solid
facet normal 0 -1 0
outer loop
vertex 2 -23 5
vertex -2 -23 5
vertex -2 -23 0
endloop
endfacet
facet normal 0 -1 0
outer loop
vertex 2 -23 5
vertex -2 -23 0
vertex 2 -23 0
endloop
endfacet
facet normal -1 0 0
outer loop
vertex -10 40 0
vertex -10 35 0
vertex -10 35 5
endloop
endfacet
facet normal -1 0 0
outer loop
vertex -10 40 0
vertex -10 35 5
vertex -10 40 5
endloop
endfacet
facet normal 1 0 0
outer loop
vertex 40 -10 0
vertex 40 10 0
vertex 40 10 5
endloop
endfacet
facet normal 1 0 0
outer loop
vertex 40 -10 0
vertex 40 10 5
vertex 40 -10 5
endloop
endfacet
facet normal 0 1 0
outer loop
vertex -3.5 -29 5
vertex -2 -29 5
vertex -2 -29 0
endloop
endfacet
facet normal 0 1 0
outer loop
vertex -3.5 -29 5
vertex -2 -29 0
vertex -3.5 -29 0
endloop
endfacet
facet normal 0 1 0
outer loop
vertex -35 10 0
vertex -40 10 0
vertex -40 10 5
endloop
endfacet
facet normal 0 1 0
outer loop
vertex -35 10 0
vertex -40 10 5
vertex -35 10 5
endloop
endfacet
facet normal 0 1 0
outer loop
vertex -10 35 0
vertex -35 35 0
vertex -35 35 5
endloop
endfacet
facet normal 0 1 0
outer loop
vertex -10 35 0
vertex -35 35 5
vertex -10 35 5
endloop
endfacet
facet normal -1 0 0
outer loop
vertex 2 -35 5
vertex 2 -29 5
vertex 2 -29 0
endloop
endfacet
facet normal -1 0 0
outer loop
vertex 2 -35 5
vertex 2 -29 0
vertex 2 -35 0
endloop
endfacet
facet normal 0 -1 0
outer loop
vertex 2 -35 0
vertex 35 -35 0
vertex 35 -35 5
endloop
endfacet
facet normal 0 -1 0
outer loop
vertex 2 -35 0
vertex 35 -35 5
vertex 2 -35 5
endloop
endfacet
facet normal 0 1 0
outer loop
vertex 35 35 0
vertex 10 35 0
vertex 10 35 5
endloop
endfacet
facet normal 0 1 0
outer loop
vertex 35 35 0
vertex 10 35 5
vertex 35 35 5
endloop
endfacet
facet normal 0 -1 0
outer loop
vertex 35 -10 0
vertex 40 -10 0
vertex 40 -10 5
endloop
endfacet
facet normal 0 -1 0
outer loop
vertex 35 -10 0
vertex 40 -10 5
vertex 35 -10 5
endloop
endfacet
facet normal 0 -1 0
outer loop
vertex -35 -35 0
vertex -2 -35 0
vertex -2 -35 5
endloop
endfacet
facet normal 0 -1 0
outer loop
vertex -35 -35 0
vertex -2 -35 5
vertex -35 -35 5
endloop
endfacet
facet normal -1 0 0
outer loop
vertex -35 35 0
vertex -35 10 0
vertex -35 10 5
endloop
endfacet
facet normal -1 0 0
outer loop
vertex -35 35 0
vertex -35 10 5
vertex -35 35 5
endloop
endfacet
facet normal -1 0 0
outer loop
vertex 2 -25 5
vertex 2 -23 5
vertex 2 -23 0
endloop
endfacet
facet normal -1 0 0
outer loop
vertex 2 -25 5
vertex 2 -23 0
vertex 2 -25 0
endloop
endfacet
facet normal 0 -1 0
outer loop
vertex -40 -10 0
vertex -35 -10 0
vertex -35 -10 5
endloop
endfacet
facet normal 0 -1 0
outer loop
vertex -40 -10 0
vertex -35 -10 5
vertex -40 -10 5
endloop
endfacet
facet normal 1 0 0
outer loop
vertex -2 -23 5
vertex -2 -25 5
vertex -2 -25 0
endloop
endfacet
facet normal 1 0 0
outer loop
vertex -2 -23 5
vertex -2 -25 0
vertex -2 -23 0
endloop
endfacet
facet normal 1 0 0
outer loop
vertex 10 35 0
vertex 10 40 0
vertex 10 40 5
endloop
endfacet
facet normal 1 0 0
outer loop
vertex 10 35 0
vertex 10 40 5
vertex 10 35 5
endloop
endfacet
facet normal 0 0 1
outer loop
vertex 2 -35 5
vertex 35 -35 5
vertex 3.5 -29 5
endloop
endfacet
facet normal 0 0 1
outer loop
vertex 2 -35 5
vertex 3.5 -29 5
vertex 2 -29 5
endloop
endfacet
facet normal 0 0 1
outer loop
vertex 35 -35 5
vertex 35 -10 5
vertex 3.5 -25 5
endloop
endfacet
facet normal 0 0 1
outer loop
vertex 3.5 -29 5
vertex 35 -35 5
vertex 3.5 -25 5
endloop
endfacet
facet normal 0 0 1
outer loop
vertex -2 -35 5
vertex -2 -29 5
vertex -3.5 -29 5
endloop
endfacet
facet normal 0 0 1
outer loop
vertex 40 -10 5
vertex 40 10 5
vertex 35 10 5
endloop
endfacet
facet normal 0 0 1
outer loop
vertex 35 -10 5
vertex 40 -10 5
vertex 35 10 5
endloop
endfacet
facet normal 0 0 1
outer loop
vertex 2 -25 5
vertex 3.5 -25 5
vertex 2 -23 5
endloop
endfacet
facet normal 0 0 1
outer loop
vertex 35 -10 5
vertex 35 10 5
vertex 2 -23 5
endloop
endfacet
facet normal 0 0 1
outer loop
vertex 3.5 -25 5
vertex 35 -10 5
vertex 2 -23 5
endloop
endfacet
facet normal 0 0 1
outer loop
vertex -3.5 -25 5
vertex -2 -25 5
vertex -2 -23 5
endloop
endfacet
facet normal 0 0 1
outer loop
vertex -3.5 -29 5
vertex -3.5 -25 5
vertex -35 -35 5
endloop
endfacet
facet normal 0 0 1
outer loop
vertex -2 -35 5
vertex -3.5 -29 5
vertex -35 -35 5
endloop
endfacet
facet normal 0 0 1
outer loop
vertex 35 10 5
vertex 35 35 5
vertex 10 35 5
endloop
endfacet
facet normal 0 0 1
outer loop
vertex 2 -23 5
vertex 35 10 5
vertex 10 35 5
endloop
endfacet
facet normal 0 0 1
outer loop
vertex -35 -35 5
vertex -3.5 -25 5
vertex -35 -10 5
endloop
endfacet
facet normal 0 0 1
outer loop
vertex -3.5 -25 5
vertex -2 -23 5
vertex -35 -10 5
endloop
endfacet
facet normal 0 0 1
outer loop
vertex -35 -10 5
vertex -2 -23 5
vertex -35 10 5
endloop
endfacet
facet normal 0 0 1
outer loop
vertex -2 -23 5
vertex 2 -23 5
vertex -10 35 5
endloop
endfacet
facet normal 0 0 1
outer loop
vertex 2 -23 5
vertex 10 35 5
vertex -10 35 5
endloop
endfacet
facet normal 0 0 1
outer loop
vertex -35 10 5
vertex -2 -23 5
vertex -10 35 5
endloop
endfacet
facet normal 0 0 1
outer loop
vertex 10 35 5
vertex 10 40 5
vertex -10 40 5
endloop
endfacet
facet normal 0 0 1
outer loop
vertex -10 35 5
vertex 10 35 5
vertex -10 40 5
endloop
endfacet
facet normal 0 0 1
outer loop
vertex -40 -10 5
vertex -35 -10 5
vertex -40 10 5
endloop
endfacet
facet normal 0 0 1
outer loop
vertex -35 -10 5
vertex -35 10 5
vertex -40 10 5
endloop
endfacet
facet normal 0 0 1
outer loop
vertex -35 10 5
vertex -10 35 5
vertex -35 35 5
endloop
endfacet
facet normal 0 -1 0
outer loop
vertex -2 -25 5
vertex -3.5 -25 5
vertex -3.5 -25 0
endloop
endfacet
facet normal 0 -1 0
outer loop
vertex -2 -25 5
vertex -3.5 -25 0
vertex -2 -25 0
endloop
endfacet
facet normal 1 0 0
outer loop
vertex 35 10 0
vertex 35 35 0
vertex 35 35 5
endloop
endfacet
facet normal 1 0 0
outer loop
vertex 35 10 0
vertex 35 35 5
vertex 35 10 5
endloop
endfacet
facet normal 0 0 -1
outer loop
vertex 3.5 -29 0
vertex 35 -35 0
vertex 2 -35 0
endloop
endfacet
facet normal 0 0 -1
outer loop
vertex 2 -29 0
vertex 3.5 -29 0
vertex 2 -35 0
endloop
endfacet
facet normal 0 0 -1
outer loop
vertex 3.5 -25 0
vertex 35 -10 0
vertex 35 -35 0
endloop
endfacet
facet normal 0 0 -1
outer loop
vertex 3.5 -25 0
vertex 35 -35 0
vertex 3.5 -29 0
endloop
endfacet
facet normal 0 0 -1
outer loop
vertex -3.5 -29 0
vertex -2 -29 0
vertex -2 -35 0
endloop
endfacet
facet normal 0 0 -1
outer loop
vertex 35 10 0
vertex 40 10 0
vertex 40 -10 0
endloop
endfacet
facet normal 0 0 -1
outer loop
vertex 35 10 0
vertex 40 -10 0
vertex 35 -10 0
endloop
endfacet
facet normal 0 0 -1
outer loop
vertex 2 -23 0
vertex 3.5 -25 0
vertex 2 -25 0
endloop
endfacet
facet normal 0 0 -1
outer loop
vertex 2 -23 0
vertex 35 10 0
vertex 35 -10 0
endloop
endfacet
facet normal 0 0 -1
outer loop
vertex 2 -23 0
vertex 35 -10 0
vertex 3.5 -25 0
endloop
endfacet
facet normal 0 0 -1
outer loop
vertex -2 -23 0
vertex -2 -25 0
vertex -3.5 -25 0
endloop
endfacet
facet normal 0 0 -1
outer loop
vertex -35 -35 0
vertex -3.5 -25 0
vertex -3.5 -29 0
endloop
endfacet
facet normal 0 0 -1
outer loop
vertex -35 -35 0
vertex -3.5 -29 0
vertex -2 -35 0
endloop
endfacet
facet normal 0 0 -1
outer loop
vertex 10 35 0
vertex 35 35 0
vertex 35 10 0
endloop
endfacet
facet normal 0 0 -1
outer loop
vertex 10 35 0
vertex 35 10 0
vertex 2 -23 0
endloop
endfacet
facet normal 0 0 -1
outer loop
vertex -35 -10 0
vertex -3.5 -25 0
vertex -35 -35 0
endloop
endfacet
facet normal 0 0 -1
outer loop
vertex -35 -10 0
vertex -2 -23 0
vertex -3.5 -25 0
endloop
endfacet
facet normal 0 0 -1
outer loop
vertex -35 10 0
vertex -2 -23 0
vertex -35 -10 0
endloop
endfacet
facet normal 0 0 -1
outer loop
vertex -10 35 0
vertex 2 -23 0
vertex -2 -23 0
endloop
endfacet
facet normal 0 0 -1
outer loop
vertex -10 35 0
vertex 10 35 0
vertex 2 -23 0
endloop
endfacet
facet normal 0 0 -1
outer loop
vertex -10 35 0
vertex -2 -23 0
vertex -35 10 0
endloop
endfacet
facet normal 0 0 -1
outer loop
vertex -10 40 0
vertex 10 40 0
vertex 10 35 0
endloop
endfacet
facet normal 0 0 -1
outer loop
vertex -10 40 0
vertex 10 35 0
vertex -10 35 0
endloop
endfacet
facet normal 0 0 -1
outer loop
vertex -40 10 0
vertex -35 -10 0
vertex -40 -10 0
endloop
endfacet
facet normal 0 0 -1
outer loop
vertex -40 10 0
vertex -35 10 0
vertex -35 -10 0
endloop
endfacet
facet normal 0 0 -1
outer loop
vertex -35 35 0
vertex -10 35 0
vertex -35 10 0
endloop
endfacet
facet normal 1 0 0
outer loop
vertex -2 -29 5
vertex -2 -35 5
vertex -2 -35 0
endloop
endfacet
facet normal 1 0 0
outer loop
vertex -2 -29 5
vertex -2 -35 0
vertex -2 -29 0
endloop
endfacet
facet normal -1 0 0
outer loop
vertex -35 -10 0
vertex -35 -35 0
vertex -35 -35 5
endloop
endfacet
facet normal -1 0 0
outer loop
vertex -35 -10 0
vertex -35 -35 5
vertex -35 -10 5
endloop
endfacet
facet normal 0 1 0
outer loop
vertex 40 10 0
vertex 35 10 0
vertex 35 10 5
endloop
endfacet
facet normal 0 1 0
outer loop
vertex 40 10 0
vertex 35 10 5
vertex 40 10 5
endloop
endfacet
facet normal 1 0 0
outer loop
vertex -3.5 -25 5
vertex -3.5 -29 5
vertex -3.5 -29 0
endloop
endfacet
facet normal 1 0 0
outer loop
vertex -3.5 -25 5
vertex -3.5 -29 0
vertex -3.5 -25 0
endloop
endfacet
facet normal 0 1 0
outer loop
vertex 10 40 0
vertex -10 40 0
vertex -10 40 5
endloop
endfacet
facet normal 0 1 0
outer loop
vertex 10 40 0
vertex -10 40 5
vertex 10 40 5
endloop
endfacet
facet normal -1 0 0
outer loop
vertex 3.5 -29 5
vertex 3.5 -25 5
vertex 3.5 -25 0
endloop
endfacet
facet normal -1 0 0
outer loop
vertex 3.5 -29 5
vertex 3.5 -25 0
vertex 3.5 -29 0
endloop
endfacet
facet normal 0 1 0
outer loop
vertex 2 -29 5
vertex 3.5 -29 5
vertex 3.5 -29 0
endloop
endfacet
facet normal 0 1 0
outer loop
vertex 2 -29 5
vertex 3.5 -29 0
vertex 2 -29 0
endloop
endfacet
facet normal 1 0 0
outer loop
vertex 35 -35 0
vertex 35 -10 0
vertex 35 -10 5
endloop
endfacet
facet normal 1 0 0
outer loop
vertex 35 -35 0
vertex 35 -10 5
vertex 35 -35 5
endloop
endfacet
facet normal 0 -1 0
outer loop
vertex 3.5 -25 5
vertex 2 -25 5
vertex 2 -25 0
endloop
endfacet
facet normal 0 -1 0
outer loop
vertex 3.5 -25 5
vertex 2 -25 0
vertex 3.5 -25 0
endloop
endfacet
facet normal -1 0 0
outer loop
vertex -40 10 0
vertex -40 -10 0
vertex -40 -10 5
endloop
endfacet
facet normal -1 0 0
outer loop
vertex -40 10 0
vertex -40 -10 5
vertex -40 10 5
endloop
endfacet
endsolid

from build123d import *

# Parameters (mm, degrees)
BOSS_EXTRUDE1_DEPTH = 5
CUT_EXTRUDE1_DEPTH  = 10


with BuildPart() as part:
    # Sketch1 → Boss-Extrude1 (new body)
    with BuildSketch(Plane.XY):
        Polygon((-35, 35), (-10, 35), (-10, 40), (10, 40), (10, 35), (35, 35), (35, 10), (40, 10), (40, -10), (35, -10), (35, -35), (-35, -35), (-35, -10), (-40, -10), (-40, 10), (-35, 10), align=None)
    extrude(amount=BOSS_EXTRUDE1_DEPTH)

    # Sketch2 → Cut-Extrude1 (cut)
    with BuildSketch(Plane.XY.offset(5)):
        Polygon((-2, -35), (-2, -29), (-3.5, -29), (-3.5, -25), (-2, -25), (-2, -23), (2, -23), (2, -25), (3.5, -25), (3.5, -29), (2, -29), (2, -35), align=None)
    extrude(amount=-CUT_EXTRUDE1_DEPTH, mode=Mode.SUBTRACT)


solid = part.part
